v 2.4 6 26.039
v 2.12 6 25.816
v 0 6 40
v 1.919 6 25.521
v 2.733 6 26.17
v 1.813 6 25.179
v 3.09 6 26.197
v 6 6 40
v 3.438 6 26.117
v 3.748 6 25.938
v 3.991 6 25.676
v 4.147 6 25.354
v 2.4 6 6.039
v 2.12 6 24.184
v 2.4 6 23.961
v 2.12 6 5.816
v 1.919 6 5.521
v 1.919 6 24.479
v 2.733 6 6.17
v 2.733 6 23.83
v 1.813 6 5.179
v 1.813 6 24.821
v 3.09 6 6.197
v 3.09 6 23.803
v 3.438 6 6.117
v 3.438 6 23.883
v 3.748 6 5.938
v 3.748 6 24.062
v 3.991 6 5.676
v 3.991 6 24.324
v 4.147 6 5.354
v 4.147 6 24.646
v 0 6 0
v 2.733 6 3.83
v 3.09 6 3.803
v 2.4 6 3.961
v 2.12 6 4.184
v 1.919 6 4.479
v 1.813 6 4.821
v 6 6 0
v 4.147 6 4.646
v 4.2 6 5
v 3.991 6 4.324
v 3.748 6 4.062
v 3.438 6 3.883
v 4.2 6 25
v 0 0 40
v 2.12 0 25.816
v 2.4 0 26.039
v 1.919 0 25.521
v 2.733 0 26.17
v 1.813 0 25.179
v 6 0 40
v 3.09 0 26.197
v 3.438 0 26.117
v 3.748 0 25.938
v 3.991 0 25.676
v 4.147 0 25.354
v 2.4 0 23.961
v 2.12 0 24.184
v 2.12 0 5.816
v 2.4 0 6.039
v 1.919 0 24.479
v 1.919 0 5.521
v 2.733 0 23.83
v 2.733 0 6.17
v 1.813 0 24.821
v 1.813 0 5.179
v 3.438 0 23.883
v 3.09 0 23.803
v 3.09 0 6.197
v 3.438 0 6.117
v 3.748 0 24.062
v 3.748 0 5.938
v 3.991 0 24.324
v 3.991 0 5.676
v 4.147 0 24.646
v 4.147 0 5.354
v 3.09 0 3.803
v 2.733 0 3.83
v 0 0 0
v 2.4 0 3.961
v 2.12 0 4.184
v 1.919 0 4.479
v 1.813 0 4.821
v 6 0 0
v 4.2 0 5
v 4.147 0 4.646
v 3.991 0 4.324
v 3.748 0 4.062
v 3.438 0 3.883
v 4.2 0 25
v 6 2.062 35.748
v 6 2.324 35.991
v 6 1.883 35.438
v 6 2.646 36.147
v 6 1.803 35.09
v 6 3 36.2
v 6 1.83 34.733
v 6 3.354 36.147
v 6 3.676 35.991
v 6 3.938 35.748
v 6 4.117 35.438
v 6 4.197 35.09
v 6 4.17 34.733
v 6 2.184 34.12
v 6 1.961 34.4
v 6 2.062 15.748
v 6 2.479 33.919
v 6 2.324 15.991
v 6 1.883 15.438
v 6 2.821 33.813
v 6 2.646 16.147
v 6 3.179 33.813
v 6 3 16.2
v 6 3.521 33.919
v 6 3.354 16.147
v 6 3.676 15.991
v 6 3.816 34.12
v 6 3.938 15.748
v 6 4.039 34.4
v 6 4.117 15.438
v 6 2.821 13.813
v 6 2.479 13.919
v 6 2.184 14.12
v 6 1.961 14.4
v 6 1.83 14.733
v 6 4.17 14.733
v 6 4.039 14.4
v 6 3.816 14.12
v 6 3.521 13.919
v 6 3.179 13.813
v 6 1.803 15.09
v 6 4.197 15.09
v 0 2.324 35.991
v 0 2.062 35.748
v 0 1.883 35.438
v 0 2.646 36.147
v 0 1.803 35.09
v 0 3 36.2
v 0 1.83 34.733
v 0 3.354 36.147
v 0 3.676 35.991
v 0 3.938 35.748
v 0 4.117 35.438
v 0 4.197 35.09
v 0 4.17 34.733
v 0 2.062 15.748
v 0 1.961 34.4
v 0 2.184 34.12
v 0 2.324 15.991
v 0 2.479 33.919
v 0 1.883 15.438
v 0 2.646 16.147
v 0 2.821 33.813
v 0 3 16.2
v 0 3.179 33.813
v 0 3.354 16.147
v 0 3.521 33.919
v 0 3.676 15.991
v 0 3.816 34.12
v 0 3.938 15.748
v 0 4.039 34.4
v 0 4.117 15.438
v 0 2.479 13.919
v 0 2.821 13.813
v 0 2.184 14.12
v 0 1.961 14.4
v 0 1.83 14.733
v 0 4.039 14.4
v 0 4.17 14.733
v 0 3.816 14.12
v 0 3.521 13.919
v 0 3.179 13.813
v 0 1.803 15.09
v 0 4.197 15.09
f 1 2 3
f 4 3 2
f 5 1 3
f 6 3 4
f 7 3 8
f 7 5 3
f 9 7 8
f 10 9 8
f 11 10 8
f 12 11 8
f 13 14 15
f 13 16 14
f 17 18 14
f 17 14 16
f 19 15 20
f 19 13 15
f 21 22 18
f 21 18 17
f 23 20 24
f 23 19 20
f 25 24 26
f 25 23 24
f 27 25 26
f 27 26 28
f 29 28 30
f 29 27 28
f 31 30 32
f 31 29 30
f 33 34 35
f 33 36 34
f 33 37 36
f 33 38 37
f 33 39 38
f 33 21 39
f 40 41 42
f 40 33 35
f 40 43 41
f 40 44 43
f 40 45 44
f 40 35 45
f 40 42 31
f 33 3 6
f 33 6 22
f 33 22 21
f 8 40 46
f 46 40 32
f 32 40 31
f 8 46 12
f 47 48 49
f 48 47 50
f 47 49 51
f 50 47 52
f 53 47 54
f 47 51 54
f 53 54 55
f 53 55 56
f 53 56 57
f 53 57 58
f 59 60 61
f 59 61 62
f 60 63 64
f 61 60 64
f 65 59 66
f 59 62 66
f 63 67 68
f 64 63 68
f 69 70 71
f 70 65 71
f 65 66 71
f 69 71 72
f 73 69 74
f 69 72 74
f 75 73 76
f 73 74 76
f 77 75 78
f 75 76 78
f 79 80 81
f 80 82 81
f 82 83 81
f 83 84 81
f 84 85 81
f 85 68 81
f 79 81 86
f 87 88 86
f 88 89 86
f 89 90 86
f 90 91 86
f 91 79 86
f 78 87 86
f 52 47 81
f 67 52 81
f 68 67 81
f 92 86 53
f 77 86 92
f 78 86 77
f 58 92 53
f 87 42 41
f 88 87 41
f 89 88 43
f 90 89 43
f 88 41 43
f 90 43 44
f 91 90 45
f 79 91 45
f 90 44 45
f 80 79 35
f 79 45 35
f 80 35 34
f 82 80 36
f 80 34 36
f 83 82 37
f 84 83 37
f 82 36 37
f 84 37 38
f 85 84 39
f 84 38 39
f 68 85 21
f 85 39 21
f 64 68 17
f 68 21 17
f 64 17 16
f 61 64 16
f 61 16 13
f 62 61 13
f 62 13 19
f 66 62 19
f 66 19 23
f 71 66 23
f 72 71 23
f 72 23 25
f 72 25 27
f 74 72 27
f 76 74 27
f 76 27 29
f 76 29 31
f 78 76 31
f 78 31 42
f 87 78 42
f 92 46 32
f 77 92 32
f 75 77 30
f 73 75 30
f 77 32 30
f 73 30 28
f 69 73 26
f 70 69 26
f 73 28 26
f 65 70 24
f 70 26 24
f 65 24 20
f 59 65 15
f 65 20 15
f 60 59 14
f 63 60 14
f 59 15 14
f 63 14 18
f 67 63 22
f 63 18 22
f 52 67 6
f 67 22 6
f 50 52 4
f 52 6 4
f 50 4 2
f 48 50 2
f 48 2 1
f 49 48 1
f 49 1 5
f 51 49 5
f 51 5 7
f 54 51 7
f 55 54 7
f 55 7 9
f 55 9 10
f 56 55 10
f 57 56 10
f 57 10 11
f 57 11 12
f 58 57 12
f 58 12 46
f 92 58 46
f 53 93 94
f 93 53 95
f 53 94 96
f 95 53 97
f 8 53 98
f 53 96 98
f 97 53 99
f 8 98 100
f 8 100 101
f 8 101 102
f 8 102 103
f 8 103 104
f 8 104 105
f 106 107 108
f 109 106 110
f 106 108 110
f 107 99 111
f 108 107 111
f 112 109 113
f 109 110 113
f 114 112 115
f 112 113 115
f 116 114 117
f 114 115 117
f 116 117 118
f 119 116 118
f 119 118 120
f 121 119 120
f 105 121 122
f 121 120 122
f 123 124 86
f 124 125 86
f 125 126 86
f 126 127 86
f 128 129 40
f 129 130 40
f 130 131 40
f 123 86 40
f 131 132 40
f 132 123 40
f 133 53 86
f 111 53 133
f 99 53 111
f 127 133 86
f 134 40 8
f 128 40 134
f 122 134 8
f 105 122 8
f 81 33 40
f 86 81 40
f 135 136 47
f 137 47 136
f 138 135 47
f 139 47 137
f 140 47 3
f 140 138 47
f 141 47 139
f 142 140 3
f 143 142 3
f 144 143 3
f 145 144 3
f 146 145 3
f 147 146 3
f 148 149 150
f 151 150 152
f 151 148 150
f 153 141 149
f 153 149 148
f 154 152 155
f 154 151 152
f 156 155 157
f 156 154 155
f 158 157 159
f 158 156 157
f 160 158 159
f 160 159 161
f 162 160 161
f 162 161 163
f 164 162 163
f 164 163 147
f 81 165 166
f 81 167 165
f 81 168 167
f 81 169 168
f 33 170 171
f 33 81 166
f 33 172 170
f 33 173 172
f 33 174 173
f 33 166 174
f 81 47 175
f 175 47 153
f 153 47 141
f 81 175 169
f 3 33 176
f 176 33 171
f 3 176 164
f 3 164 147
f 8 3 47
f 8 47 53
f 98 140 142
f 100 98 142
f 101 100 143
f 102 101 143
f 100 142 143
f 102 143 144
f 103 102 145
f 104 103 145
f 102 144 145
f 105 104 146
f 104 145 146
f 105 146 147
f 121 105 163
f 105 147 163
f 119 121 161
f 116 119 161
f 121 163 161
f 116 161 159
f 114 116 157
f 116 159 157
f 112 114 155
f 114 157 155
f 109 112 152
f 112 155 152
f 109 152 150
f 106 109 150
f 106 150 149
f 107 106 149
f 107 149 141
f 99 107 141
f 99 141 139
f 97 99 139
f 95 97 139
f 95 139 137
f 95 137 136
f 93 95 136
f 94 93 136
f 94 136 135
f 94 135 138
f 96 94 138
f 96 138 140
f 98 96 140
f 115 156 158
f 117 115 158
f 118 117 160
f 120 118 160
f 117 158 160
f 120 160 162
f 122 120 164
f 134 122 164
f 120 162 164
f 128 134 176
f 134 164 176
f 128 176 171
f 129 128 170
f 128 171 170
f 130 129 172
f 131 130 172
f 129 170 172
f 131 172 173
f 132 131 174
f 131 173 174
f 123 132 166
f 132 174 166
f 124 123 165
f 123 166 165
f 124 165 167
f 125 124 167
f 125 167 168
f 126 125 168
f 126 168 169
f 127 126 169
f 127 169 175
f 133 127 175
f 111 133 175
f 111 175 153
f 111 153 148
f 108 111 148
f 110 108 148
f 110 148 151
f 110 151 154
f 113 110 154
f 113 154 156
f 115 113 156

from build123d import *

# Parameters (mm, degrees)
SKETCH_1_W          = 6
SKETCH_1_H          = 6
EXTRUDE_1_DEPTH     = 40
SKETCH_2_R          = 1.2
CUT_EXTRUDE_1_DEPTH = 50
SKETCH_3_R          = 1.2
CUT_EXTRUDE_2_DEPTH = 50


with BuildPart() as part:
    # 草图1 → 凸台-拉伸1 (new body)
    with BuildSketch(Plane.XY):
        with Locations((3, 3)):
            Rectangle(SKETCH_1_W, SKETCH_1_H)
    extrude(amount=EXTRUDE_1_DEPTH)

    # 草图2 → 切除-拉伸1 (cut)
    with BuildSketch(Plane(origin=(0, 6, 0), x_dir=(1, 0, 0), z_dir=(0, 1, 0))):
        with Locations((3, -5)):
            Circle(SKETCH_2_R)
        with Locations((3, -25)):
            Circle(SKETCH_2_R)
    extrude(amount=-CUT_EXTRUDE_1_DEPTH, mode=Mode.SUBTRACT)

    # 草图3 → 切除-拉伸2 (cut)
    with BuildSketch(Plane.ZY):
        with Locations((35, 3)):
            Circle(SKETCH_3_R)
        with Locations((15, 3)):
            Circle(SKETCH_3_R)
    extrude(amount=-CUT_EXTRUDE_2_DEPTH, mode=Mode.SUBTRACT)


solid = part.part
